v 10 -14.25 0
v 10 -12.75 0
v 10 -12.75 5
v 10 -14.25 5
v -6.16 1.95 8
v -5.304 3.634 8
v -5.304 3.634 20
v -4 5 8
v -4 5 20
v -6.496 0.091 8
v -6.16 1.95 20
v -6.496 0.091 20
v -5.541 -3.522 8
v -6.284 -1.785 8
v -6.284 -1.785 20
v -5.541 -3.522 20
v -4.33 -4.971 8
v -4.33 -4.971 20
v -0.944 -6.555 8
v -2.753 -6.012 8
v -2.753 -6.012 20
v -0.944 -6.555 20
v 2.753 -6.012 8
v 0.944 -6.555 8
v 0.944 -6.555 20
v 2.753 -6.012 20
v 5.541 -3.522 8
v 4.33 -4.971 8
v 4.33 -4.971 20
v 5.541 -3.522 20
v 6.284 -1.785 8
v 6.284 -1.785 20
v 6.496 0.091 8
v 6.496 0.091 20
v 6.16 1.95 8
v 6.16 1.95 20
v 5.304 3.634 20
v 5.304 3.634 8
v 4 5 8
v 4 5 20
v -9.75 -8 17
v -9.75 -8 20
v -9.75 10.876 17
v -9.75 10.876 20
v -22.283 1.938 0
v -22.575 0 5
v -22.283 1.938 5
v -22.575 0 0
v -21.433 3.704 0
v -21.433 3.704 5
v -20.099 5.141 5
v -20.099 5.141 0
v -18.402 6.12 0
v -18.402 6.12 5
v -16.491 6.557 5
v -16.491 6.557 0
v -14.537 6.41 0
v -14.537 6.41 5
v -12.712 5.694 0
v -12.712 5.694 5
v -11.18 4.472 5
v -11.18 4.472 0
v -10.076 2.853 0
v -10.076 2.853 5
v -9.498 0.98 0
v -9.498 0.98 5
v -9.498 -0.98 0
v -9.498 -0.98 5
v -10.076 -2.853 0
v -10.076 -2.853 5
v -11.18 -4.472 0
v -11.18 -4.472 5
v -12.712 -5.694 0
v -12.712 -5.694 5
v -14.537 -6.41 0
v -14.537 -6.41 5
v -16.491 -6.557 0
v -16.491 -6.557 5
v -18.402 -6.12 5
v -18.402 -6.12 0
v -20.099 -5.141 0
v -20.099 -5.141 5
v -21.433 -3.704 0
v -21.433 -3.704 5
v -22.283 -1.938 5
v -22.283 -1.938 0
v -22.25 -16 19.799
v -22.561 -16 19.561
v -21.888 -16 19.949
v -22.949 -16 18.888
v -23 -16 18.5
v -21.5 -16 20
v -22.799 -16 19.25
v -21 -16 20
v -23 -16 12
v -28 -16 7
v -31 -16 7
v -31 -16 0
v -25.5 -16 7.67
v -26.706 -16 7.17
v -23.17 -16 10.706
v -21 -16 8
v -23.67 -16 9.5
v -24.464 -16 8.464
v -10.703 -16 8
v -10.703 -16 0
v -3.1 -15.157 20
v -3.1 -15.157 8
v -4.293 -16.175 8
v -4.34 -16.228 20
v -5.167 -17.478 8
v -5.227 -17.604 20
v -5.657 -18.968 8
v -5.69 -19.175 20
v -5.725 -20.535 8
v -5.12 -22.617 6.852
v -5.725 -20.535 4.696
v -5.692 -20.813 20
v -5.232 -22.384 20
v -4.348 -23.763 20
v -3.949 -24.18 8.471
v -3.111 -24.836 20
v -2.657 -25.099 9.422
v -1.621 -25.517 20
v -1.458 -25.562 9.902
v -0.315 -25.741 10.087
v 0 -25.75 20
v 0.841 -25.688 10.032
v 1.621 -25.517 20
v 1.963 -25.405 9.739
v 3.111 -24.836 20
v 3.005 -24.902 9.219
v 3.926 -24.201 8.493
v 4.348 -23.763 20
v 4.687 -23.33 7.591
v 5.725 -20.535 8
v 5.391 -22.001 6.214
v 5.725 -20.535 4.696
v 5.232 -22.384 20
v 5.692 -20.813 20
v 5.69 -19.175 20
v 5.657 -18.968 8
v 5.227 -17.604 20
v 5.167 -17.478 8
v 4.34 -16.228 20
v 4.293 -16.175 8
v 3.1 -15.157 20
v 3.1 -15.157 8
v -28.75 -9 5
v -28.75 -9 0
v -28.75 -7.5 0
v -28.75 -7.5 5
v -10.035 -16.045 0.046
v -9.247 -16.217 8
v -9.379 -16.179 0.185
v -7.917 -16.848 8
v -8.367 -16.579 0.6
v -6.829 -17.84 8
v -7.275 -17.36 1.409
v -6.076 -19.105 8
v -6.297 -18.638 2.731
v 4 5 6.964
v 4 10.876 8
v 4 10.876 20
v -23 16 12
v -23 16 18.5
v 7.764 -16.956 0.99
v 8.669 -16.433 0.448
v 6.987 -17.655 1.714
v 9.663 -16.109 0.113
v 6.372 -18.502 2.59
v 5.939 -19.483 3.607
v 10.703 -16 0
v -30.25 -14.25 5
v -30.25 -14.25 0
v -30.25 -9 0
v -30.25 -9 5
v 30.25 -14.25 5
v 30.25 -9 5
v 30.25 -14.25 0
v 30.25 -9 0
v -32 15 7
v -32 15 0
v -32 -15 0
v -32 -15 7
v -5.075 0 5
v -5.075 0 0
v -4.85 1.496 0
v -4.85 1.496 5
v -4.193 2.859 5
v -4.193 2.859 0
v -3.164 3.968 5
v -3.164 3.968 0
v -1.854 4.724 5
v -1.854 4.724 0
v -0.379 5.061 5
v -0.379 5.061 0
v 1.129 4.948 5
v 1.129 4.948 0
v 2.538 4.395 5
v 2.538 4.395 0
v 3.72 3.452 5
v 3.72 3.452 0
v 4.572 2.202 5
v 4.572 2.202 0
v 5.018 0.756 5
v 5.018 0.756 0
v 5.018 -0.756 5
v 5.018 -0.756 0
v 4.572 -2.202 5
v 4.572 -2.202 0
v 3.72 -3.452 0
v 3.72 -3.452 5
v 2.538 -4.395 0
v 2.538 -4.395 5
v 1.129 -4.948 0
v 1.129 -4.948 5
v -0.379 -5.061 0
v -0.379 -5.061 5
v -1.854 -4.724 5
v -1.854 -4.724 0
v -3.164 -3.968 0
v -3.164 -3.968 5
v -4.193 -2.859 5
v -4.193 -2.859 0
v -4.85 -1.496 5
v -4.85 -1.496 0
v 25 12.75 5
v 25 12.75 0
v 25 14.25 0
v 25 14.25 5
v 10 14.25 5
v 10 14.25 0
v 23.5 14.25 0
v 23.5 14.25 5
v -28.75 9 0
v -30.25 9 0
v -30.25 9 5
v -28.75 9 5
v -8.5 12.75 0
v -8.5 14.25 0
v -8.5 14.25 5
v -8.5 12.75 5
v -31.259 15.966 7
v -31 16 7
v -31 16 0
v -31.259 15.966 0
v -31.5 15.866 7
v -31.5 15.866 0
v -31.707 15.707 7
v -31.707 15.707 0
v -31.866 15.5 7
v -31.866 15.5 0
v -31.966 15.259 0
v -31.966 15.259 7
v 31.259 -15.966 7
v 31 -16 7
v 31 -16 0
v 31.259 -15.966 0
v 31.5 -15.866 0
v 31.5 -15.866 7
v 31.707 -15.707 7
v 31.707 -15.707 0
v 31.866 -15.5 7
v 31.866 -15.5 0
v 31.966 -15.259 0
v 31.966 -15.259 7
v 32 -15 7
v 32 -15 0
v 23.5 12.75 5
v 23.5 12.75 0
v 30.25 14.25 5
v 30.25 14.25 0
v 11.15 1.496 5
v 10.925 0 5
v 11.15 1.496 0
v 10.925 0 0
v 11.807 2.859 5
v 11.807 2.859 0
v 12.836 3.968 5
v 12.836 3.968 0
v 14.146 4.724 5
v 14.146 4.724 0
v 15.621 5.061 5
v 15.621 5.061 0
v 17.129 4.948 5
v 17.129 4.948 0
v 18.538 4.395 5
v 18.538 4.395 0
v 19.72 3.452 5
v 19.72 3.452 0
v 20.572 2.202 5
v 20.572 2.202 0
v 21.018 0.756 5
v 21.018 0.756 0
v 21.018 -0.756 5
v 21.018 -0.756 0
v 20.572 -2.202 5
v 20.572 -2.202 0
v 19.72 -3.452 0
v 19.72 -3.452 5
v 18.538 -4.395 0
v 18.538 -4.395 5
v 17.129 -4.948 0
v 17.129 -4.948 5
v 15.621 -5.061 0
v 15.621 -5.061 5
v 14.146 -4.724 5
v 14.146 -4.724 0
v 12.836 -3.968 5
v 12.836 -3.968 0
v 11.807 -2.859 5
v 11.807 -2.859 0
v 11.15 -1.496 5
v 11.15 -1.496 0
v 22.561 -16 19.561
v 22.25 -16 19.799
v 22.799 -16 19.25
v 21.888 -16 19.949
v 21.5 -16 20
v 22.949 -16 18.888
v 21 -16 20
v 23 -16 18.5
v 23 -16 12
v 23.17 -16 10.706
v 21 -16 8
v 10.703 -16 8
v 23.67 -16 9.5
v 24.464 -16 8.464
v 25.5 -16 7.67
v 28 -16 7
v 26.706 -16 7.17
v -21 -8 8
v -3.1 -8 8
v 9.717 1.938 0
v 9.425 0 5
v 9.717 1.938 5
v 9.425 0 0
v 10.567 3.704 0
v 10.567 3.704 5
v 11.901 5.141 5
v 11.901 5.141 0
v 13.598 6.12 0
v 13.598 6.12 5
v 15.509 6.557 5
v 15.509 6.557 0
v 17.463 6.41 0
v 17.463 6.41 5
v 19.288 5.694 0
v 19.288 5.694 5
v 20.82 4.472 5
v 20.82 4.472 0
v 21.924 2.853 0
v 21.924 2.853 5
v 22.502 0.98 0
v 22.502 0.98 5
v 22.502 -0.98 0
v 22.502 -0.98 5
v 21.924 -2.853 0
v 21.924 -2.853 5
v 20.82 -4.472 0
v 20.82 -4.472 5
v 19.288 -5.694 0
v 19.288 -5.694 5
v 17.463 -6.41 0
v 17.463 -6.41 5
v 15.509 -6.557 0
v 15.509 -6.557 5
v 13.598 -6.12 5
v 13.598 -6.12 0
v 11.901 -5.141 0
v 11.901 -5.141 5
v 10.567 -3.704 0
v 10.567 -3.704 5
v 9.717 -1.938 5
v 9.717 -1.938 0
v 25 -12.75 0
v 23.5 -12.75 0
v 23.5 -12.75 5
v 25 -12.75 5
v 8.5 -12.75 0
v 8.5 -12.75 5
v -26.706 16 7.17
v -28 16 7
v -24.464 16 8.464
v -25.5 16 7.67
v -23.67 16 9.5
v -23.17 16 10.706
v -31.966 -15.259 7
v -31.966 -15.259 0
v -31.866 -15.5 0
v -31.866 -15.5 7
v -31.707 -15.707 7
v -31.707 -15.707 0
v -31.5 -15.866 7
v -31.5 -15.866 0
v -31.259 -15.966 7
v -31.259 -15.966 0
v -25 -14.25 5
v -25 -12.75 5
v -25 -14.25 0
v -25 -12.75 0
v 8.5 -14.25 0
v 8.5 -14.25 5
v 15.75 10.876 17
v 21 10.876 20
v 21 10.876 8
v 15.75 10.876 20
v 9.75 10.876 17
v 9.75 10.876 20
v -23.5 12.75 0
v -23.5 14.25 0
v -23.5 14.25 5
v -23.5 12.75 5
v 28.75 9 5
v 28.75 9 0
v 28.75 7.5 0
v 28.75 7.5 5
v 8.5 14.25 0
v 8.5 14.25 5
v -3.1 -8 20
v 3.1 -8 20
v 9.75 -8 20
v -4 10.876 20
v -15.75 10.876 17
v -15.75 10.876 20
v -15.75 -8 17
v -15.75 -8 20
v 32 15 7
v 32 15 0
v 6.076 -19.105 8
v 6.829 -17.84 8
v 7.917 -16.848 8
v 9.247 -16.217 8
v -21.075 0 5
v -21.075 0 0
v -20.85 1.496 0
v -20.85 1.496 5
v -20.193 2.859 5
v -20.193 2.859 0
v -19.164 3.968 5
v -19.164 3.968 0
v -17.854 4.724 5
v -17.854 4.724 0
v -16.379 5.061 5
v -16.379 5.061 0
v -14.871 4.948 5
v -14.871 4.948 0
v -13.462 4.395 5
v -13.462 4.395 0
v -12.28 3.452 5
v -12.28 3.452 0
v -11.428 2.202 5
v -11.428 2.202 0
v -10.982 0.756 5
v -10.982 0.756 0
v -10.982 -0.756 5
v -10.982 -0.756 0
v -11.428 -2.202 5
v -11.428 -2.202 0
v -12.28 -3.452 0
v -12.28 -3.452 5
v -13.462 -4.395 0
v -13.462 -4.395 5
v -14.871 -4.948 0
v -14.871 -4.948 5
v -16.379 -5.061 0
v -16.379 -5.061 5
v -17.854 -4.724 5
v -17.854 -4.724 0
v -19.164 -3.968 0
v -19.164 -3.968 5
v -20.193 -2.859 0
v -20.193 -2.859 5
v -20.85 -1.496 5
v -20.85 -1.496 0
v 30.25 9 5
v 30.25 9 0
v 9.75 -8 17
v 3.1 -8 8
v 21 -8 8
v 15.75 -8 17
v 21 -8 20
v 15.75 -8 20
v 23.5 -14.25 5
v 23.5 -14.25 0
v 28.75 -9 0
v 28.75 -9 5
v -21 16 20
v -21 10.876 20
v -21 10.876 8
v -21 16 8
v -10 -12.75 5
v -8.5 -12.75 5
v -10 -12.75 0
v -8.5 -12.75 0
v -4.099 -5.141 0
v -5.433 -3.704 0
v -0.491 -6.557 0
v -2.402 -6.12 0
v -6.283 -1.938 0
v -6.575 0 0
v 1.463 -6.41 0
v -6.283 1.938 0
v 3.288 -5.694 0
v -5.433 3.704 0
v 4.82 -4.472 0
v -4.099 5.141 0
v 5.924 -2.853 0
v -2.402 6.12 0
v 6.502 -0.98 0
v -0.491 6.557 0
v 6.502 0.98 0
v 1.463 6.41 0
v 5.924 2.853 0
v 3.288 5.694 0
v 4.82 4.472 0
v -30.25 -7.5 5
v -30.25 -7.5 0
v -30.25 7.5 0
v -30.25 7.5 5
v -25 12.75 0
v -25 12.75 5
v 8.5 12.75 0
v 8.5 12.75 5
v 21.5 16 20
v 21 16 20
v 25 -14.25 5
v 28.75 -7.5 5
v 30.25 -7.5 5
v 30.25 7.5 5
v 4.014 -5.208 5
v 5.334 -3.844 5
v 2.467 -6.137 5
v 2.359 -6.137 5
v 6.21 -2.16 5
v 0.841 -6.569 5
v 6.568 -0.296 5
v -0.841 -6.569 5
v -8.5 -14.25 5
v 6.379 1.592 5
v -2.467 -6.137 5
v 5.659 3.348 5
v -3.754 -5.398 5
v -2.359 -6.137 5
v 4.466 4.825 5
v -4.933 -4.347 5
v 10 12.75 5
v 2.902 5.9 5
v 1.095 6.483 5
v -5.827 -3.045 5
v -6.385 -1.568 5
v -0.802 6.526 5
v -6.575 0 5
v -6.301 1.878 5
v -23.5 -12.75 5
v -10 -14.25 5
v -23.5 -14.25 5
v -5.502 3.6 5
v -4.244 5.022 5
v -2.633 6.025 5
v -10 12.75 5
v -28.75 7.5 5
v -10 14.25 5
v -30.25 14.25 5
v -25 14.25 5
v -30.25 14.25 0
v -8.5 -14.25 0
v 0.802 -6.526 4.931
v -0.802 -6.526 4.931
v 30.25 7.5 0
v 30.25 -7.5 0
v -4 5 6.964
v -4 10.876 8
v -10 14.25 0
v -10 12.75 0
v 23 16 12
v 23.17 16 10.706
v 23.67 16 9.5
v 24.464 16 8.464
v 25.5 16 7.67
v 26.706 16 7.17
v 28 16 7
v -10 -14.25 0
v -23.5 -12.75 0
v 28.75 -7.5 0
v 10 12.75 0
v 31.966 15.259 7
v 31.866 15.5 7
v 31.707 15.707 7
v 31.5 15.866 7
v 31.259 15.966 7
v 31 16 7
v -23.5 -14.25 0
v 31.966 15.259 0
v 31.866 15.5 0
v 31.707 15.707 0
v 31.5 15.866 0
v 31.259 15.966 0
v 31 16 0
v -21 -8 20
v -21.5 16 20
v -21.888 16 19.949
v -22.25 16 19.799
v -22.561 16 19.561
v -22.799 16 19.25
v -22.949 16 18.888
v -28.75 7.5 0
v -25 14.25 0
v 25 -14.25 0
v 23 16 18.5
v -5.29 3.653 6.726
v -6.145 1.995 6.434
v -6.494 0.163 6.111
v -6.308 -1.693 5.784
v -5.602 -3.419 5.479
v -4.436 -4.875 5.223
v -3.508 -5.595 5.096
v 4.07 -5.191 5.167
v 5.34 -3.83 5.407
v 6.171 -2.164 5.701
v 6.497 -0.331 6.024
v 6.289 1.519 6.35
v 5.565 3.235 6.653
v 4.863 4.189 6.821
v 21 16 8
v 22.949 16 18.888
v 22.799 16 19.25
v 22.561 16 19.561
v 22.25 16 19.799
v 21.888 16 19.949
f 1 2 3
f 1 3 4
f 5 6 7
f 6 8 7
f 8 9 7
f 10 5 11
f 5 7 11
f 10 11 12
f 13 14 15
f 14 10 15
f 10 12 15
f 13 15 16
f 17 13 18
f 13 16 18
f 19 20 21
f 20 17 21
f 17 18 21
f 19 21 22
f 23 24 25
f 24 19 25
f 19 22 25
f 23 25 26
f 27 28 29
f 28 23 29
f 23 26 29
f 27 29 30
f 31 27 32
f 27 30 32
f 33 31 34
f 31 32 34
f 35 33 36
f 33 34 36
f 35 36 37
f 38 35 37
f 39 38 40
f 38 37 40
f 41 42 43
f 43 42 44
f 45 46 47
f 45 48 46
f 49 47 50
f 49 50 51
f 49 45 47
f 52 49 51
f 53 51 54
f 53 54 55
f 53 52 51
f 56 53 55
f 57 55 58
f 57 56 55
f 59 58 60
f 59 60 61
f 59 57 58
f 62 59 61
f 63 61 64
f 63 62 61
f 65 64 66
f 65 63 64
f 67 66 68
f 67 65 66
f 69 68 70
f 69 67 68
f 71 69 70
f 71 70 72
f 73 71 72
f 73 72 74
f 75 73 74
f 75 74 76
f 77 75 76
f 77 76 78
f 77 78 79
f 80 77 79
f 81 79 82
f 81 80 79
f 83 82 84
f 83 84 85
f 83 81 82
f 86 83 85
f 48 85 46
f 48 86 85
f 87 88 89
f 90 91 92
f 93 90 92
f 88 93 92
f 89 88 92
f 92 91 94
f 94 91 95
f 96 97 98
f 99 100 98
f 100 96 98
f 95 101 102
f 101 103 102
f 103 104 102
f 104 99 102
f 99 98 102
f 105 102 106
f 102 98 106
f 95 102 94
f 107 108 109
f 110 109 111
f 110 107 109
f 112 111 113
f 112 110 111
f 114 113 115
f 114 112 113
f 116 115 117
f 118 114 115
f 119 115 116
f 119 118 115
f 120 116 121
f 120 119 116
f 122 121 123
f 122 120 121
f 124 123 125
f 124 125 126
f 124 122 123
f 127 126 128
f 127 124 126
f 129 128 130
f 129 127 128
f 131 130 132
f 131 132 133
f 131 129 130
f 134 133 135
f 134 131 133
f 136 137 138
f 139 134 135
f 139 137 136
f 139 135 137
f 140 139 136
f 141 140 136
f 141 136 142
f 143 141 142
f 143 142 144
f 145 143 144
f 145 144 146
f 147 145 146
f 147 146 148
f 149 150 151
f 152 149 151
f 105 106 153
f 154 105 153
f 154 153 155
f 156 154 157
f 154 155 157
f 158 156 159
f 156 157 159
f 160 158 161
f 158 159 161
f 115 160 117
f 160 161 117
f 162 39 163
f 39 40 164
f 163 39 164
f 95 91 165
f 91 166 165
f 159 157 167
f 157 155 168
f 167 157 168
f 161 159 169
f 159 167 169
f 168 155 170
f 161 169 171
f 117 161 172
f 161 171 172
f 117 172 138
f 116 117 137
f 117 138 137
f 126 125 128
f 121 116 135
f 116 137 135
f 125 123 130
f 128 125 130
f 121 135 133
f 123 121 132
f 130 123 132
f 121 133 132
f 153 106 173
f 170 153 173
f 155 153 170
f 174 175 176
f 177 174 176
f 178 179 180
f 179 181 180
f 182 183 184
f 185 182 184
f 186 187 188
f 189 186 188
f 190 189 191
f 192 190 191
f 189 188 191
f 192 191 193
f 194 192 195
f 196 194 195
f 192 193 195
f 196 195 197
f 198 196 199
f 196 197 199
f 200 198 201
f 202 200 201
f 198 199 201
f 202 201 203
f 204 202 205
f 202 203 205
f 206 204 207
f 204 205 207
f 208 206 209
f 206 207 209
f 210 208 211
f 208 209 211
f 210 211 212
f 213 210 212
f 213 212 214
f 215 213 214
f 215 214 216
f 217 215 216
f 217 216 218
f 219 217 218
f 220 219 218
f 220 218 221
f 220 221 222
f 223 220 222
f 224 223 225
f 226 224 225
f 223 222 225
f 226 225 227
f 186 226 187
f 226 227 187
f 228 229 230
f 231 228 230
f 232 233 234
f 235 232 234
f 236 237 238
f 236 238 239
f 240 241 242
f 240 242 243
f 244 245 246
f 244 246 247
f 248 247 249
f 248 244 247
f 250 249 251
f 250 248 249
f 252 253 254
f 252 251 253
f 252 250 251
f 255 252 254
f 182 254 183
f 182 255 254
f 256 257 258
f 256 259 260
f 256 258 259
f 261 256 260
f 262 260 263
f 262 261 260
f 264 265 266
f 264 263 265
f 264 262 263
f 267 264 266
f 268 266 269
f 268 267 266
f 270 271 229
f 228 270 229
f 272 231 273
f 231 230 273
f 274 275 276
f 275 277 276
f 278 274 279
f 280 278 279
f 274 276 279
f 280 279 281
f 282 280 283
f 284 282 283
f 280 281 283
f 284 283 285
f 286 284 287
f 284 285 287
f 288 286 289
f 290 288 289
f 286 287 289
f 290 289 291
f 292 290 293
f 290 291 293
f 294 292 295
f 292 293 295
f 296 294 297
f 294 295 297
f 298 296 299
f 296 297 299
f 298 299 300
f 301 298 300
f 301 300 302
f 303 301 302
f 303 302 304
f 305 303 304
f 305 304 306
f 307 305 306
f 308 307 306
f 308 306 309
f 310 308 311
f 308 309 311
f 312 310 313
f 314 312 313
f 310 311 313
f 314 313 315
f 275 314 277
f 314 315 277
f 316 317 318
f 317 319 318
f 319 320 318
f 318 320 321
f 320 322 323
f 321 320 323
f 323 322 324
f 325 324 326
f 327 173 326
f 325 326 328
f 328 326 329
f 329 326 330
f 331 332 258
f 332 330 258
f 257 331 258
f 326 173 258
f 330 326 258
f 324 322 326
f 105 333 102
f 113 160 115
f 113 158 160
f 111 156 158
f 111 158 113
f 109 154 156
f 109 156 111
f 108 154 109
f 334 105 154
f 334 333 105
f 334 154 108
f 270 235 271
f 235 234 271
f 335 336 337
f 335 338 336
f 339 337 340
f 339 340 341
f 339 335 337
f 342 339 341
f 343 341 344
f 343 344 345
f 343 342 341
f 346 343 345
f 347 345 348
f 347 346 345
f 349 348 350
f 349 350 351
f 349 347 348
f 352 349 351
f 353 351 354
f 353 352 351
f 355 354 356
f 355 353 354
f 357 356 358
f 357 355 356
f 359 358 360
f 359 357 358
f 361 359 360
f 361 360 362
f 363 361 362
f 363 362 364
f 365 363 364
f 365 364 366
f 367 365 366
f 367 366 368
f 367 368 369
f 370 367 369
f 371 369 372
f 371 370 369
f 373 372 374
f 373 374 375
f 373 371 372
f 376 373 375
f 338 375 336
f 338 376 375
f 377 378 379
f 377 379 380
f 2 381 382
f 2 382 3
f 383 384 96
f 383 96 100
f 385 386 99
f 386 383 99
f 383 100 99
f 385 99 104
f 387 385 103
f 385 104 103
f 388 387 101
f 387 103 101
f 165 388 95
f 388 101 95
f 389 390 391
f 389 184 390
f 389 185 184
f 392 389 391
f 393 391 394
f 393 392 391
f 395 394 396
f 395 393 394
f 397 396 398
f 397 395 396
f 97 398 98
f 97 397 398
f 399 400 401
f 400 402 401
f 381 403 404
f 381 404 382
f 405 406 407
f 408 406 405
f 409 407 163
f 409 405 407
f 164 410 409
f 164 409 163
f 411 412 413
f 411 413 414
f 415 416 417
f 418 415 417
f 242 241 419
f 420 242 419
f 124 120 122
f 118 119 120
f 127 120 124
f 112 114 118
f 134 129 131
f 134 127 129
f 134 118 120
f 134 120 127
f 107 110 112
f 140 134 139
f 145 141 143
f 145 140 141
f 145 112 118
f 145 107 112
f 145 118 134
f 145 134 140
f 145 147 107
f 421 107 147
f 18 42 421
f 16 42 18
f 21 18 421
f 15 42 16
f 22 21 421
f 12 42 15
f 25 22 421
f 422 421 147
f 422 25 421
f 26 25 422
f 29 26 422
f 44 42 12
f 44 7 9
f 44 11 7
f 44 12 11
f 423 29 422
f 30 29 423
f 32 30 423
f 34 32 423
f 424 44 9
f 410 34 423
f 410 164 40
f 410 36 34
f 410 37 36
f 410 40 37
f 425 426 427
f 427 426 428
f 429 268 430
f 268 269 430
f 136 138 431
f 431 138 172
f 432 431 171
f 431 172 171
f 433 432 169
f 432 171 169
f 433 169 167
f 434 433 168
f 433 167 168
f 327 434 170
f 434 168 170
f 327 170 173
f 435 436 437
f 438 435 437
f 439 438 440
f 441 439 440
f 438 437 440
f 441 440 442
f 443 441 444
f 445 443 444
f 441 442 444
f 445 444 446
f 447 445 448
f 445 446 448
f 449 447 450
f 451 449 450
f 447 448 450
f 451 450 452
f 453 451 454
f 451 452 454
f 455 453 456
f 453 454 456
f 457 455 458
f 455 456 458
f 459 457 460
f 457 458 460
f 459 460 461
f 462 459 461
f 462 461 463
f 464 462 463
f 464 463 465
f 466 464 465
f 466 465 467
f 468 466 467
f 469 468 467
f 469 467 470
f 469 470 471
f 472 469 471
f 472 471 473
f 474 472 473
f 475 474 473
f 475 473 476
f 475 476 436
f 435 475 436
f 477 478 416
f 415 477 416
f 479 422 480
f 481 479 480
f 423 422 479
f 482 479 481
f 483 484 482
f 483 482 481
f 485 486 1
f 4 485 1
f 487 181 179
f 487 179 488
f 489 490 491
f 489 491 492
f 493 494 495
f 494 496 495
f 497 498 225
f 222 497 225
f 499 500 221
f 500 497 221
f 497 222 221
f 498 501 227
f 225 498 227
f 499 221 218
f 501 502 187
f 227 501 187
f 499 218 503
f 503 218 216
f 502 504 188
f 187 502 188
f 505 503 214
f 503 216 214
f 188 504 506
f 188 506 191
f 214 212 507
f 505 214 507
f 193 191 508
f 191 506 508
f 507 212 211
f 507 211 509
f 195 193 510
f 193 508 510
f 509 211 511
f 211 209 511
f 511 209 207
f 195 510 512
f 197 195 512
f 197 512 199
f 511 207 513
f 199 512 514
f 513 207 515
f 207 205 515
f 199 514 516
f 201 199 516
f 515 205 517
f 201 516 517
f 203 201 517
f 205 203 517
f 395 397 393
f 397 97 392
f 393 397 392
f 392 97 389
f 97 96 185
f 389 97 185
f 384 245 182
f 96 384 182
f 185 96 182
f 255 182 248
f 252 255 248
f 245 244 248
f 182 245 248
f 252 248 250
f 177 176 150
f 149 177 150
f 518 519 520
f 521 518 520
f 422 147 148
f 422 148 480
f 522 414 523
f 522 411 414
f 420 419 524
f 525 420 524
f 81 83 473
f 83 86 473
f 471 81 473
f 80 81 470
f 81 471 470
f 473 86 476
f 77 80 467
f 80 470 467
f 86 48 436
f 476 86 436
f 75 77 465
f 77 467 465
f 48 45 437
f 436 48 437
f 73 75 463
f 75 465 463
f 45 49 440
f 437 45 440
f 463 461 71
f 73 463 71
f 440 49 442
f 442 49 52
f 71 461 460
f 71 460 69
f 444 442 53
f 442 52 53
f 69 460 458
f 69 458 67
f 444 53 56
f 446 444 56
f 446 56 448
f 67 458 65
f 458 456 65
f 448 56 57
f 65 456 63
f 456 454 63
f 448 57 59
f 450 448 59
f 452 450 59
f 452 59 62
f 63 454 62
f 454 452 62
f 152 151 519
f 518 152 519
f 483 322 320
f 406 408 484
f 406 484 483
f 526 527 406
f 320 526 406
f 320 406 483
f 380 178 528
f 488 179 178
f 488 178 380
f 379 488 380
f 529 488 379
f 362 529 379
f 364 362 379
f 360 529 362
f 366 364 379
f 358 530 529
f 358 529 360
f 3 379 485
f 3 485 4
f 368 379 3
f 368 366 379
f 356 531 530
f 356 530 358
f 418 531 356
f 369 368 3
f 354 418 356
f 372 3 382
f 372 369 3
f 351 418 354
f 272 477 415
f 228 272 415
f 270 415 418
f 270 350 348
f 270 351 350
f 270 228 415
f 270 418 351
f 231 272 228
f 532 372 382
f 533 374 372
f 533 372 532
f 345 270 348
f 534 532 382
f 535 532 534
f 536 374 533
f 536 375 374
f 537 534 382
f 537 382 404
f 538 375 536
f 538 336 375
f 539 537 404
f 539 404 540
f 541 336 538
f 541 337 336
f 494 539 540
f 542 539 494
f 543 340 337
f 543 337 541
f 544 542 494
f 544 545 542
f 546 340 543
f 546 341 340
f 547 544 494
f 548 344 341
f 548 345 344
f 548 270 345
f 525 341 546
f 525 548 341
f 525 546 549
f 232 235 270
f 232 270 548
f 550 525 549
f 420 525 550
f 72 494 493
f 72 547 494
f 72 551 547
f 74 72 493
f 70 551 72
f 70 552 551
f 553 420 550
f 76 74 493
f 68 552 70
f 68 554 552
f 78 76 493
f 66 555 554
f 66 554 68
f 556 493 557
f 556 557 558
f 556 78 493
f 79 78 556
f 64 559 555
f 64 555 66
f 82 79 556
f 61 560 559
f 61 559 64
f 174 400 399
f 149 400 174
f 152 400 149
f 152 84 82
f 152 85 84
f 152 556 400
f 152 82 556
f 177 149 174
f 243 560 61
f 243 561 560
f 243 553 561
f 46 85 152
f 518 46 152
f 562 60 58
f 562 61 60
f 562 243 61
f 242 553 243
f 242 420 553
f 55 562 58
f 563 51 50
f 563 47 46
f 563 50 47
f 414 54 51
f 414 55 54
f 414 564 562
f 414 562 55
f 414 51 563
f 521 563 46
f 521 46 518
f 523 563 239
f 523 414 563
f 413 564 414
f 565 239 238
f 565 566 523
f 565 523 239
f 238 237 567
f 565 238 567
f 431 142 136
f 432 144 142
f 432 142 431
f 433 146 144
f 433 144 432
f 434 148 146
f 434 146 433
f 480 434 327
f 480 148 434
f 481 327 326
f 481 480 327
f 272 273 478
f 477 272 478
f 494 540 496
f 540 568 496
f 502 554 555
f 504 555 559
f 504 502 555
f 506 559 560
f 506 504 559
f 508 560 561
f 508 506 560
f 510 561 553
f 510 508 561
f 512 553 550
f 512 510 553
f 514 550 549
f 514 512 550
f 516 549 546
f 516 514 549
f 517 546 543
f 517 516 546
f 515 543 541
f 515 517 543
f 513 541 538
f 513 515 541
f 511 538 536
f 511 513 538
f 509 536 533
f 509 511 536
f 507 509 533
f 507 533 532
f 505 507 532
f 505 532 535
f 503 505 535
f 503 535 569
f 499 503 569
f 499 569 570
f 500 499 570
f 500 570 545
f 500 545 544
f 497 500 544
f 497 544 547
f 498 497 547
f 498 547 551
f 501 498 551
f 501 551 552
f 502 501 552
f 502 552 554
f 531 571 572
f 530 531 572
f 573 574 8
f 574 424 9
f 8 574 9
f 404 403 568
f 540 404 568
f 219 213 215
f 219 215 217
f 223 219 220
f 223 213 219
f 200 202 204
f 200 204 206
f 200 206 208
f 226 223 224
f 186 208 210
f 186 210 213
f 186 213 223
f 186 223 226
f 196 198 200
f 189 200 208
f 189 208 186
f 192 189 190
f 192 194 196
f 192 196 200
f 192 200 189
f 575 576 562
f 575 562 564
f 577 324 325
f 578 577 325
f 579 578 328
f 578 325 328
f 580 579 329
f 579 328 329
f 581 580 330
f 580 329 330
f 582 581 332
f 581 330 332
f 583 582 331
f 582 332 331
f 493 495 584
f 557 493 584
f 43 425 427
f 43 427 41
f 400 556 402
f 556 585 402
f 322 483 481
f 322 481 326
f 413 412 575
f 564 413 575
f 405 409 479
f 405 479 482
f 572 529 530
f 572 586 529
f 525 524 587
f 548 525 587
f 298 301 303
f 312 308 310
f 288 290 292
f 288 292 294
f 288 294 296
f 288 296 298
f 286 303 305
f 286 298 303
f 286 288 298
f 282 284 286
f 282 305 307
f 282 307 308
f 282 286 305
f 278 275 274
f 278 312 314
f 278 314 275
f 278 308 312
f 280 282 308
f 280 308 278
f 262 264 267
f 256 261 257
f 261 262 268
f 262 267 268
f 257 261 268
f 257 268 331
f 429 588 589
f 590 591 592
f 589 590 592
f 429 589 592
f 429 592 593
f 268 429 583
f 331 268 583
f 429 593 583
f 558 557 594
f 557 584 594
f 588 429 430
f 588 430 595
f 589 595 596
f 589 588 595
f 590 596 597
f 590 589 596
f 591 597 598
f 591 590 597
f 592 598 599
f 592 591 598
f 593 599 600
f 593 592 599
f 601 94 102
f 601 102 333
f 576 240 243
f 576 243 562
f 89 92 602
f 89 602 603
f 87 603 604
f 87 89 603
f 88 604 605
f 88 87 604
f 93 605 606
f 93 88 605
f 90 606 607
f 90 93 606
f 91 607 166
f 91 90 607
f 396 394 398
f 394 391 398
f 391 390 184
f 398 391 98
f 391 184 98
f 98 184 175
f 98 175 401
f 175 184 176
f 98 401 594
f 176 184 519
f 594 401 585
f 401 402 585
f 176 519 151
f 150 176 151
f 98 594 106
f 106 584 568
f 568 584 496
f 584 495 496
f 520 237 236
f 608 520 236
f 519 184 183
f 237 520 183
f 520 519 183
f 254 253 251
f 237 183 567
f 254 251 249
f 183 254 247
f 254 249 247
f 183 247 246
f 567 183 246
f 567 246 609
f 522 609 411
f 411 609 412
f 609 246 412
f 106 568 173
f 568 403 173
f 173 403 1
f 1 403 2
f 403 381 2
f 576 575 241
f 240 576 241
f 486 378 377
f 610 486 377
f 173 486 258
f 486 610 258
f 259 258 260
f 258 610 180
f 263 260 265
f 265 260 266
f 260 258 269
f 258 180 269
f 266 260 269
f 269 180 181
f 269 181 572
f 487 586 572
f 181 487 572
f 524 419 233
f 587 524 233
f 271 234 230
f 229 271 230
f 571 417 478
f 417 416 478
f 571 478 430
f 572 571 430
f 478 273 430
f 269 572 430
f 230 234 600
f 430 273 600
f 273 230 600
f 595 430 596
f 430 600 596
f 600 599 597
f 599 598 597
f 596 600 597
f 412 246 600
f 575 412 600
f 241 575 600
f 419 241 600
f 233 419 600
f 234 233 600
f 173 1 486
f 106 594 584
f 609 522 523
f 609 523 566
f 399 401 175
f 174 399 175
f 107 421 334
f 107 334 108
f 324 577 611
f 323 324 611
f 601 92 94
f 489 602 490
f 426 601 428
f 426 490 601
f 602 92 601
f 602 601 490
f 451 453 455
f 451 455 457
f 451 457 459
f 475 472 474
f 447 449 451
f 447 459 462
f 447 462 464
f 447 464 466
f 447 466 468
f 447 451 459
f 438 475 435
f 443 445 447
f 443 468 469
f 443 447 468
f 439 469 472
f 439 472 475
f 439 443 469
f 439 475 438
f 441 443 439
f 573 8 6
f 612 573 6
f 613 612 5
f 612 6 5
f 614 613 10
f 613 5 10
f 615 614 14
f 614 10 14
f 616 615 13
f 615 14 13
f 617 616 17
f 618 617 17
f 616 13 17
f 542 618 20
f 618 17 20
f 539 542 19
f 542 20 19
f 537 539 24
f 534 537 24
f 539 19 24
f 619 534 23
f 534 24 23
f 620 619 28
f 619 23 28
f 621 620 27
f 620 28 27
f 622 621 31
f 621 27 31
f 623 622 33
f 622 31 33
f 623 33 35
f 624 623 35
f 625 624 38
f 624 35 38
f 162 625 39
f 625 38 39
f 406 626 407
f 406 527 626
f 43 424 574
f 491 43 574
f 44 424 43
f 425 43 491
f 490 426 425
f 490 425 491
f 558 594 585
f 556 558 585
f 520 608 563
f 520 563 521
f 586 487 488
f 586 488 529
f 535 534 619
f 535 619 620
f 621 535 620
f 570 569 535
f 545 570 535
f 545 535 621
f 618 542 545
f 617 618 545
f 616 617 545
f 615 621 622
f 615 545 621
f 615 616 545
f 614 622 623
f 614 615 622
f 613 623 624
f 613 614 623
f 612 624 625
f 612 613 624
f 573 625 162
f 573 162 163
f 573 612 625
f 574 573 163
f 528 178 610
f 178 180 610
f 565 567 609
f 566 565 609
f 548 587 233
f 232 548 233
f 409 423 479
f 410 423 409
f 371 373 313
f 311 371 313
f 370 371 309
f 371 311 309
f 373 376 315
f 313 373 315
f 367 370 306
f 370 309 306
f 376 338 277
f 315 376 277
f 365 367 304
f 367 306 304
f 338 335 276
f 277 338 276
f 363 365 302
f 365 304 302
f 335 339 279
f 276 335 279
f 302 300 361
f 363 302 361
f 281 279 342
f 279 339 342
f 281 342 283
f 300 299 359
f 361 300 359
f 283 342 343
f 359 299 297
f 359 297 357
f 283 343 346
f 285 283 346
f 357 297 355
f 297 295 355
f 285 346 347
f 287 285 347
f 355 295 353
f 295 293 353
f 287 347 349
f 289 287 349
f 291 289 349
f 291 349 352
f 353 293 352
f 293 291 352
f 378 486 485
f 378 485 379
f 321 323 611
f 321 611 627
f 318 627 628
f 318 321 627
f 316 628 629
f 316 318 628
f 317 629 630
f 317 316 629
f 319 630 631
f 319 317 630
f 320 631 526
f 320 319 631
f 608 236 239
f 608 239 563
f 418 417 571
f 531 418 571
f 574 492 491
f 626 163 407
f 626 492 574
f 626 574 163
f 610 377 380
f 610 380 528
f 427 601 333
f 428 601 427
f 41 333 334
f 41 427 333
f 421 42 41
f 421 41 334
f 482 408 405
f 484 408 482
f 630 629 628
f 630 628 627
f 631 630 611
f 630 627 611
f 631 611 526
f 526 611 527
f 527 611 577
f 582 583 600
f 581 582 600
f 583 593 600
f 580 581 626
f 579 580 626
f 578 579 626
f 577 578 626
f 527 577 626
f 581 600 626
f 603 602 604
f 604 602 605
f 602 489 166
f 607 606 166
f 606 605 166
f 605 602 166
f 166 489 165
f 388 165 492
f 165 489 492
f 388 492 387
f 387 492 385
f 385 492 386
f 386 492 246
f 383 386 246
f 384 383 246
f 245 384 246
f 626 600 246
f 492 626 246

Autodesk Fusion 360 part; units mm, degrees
sketch "Skizze1" plane through (0, 0, 0) normal (0, 0, 1) x (1, 0, 0)
  line L0 (32, 16) -> (-32, 16)
  line L1 (-32, 16) -> (-32, -16)
  line L2 (-32, -16) -> (32, -16)
  line L3 (32, -16) -> (32, 16)
  line L4 (32, 16) -> (-32, -16) construction
  line L5 (-32, 16) -> (32, -16) construction
  dimension "d1" = 64
  dimension "d2" = 32
extrude "Extrusion1" add sketch "Skizze1" along normal blind 20
sketch "Skizze2" plane through (0, 0, 0) normal (0, 0, -1) x (-1, 0, 0)
  line L0 (-32, 16) -> (-32, -16)
  line L1 (-32, -16) -> (32, -16)
  line L2 (32, -16) -> (32, 16)
  line L3 (32, 16) -> (-32, 16)
  line L4 (30.25, 14.25) -> (-30.25, 14.25)
  line L5 (-30.25, 14.25) -> (-30.25, -14.25)
  line L6 (-30.25, -14.25) -> (30.25, -14.25)
  line L7 (30.25, -14.25) -> (30.25, 14.25)
  line L8 (30.25, 14.25) -> (-30.25, -14.25) construction
  line L9 (-30.25, 14.25) -> (30.25, -14.25) construction
  line L10 (-25, 14.25) -> (-23.5, 14.25)
  line L11 (-23.5, 14.25) -> (-23.5, 12.75)
  line L12 (-23.5, 12.75) -> (-25, 12.75)
  line L13 (-25, 12.75) -> (-25, 14.25)
  line L14 (-30.25, 9) -> (-28.75, 9)
  line L15 (-28.75, 9) -> (-28.75, 7.5)
  line L16 (-28.75, 7.5) -> (-30.25, 7.5)
  line L17 (-30.25, 7.5) -> (-30.25, 9)
  line L18 (-10, 14.25) -> (-8.5, 14.25)
  line L19 (-8.5, 14.25) -> (-8.5, 12.75)
  line L20 (-8.5, 12.75) -> (-10, 12.75)
  line L21 (-10, 12.75) -> (-10, 14.25)
  line L22 (-24.25, 12.75) -> (-24.25, 14.25) construction
  line L23 (-28.75, 8.25) -> (-30.25, 8.25) construction
  line L24 (-9.25, 12.75) -> (-9.25, 14.25) construction
  line L25 (0, 0) -> (0, 14.25) construction
  line L26 (0, 0) -> (-30.25, 0) construction
  line L27 (24.25, 12.75) -> (24.25, 14.25) construction
  line L28 (8.5, 14.25) -> (8.5, 12.75)
  line L29 (28.75, 7.5) -> (30.25, 7.5)
  line L30 (10, 14.25) -> (8.5, 14.25)
  line L31 (8.5, 12.75) -> (10, 12.75)
  line L32 (23.5, 12.75) -> (25, 12.75)
  line L33 (28.75, 8.25) -> (30.25, 8.25) construction
  line L34 (28.75, 9) -> (28.75, 7.5)
  line L35 (25, 12.75) -> (25, 14.25)
  line L36 (30.25, 7.5) -> (30.25, 9)
  line L37 (9.25, 12.75) -> (9.25, 14.25) construction
  line L38 (30.25, 9) -> (28.75, 9)
  line L39 (10, 12.75) -> (10, 14.25)
  line L40 (25, 14.25) -> (23.5, 14.25)
  line L41 (23.5, 14.25) -> (23.5, 12.75)
  line L42 (-25, -12.75) -> (-25, -14.25)
  line L43 (-28.75, -9) -> (-28.75, -7.5)
  line L44 (-30.25, -9) -> (-28.75, -9)
  line L45 (30.25, -14.25) -> (-30.25, -14.25)
  line L46 (-28.75, -8.25) -> (-30.25, -8.25) construction
  line L47 (25, -14.25) -> (23.5, -14.25)
  line L48 (-10, -14.25) -> (-8.5, -14.25)
  line L49 (23.5, -12.75) -> (25, -12.75)
  line L50 (-23.5, -14.25) -> (-23.5, -12.75)
  line L51 (32, -16) -> (-32, -16)
  line L52 (10, -12.75) -> (10, -14.25)
  line L53 (-9.25, -12.75) -> (-9.25, -14.25) construction
  line L54 (-28.75, -7.5) -> (-30.25, -7.5)
  line L55 (8.5, -12.75) -> (10, -12.75)
  line L56 (-10, -12.75) -> (-10, -14.25)
  line L57 (28.75, -8.25) -> (30.25, -8.25) construction
  line L58 (-25, -14.25) -> (-23.5, -14.25)
  line L59 (8.5, -14.25) -> (8.5, -12.75)
  line L60 (24.25, -12.75) -> (24.25, -14.25) construction
  line L61 (-23.5, -12.75) -> (-25, -12.75)
  line L62 (30.25, -9) -> (28.75, -9)
  line L63 (-8.5, -14.25) -> (-8.5, -12.75)
  line L64 (23.5, -14.25) -> (23.5, -12.75)
  line L65 (30.25, -7.5) -> (30.25, -9)
  line L66 (10, -14.25) -> (8.5, -14.25)
  line L67 (-24.25, -12.75) -> (-24.25, -14.25) construction
  line L68 (28.75, -9) -> (28.75, -7.5)
  line L69 (9.25, -12.75) -> (9.25, -14.25) construction
  line L70 (-8.5, -12.75) -> (-10, -12.75)
  line L71 (-30.25, -7.5) -> (-30.25, -9)
  line L72 (28.75, -7.5) -> (30.25, -7.5)
  line L73 (25, -12.75) -> (25, -14.25)
  circle A0 centre (0, 0) radius 6.575
  circle A1 centre (16, 0) radius 6.575
  circle A2 centre (-16, 0) radius 6.575
  circle A3 centre (-16, 0) radius 5.075
  circle A4 centre (0, 0) radius 5.075
  circle A5 centre (16, 0) radius 5.075
  point P0 (32, 16)
  point P1 (30.25, 14.25)
  point P2 (0, -14.25)
  point P3 (32, -16)
  point P4 (30.25, -14.25)
  dimension "d7" = 1.75
  dimension "d8" = 1.75
  dimension "d9" = 1.5
  dimension "d10" = 1.5
  dimension "d11" = 6
  dimension "d12" = 6
  dimension "d13" = 15
  dimension "d14" = 13.15
  dimension "d17" = 16
  dimension "d18" = 0
  dimension "d19" = 1.5
extrude "Extrusion2" cut sketch "Skizze2" against normal blind 5 contours L4 L5 L6 L7 L11 L12 L13 L14 L15 L16 L19 L20 L21 L28 L29 L31 L32 L34 L35 L38 L39 L41 L42 L43 L44 L45 L49 L50 L52 L54 L55 L56 L59 L61 L62 L63 L64 L68 L70 L72 L73 | A3 | A4 | A5
sketch "Skizze3" plane through (0, 0, 20) normal (0, 0, 1) x (1, 0, 0)
  line L0 (32, -16) -> (32, 16)
  line L1 (32, 16) -> (-32, 16)
  line L2 (-32, 16) -> (-32, -16)
  line L3 (-32, -16) -> (32, -16)
  circle A0 centre (0, -0.1235) radius 6.5
  line L4 (0, -0.1235) -> (0, 16) construction
  line L5 (-21, 16) -> (21, 16)
  line L6 (21, 16) -> (21, 10.8765)
  line L7 (21, 10.8765) -> (-21, 10.8765)
  line L8 (-21, 10.8765) -> (-21, 16)
  line L9 (-21, 16) -> (21, 10.8765) construction
  line L10 (21, 16) -> (-21, 10.8765) construction
  line L11 (-4, 5) -> (4, 5)
  line L12 (4, 5) -> (4, 10.8765)
  line L13 (4, 10.8765) -> (-4, 10.8765)
  line L14 (-4, 10.8765) -> (-4, 5)
  line L15 (-4, 5) -> (4, 10.8765) construction
  line L16 (4, 5) -> (-4, 10.8765) construction
  point P0 (0, 13.4383)
  point P1 (0, 7.9383)
  dimension "d22" = 42
  dimension "d23" = 8
  dimension "d24" = 13
  dimension "d25" = 11
extrude "Extrusion3" cut sketch "Skizze3" against normal blind 12 contours L1 L5 L6 L7 L8 L13 | A0 L7 L12 L13 L14 | A0 L11 | A0 L11
sketch "Skizze4" plane through (0, 0, 20) normal (0, 0, 1) x (1, 0, 0)
  line L0 (-21, 10.8765) -> (-21, 16)
  line L1 (-21, 16) -> (-32, 16)
  line L2 (-32, 16) -> (-32, -16)
  line L3 (-32, -16) -> (32, -16)
  line L4 (32, -16) -> (32, 16)
  line L5 (32, 16) -> (21, 16)
  line L6 (21, 16) -> (21, 10.8765)
  line L7 (21, 10.8765) -> (4, 10.8765)
  line L8 (4, 10.8765) -> (4, 5)
  arc A0 (-4, 5) -> (4, 5) centre (0, -0.1235) ccw
  line L9 (-4, 5) -> (-4, 10.8765)
  line L10 (-4, 10.8765) -> (-21, 10.8765)
  line L11 (0, 0) -> (0, -20) construction
  circle A1 centre (0, -20) radius 5.75
  line L12 (-3.1, -15.1572) -> (3.1, -15.1572)
  line L13 (3.1, -15.1572) -> (3.1, -8)
  line L14 (3.1, -8) -> (-3.1, -8)
  line L15 (-3.1, -8) -> (-3.1, -15.1572)
  line L16 (-3.1, -15.1572) -> (3.1, -8) construction
  line L17 (3.1, -15.1572) -> (-3.1, -8) construction
  line L18 (-21, -8) -> (21, -8)
  line L19 (21, -8) -> (21, -28)
  line L20 (21, -28) -> (-21, -28)
  line L21 (-21, -28) -> (-21, -8)
  line L22 (-21, -8) -> (21, -28) construction
  line L23 (21, -8) -> (-21, -28) construction
  point P0 (0, -11.5786)
  point P1 (0, -18)
  dimension "d29" = 11.5
  dimension "d30" = 6.2
  dimension "d31" = 8
  dimension "d32" = 12
  dimension "d33" = 20
  dimension "d34" = 42
extrude "Extrusion4" cut sketch "Skizze4" against normal blind 12 contours L3 A1 L15 L18 L21 | L3 A1 L13 L18 L19
extrude "Extrusion5" add sketch "Skizze4" against normal blind 20 contours L3 A1
fillet "Abrundung1" radius 5 2 edges at (-4.1307, -16, 4) (4.1307, -16, 4)
sketch "Skizze5" plane through (0, 0, 20) normal (0, 0, 1) x (1, 0, 0)
  line L0 (21, -8) -> (21, -16)
  line L1 (21, -16) -> (32, -16)
  line L2 (32, -16) -> (32, 16)
  line L3 (32, 16) -> (21, 16)
  line L4 (21, 16) -> (21, 10.8765)
  line L5 (21, 10.8765) -> (4, 10.8765)
  line L6 (4, 10.8765) -> (4, 5)
  arc A0 (-4, 5) -> (4, 5) centre (0, -0.1235) ccw
  line L7 (-4, 5) -> (-4, 10.8765)
  line L8 (-4, 10.8765) -> (-21, 10.8765)
  line L9 (-21, 10.8765) -> (-21, 16)
  line L10 (-21, 16) -> (-32, 16)
  line L11 (-32, 16) -> (-32, -16)
  line L12 (-32, -16) -> (-21, -16)
  line L13 (-21, -16) -> (-21, -8)
  line L14 (-21, -8) -> (-3.1, -8)
  line L15 (-3.1, -8) -> (-3.1, -15.1572)
  arc A1 (-3.1, -15.1572) -> (3.1, -15.1572) centre (0, -20) ccw
  line L16 (3.1, -15.1572) -> (3.1, -8)
  line L17 (3.1, -8) -> (21, -8)
  line L18 (0, -0.1235) -> (0, 16)
  line L19 (-9.75, 16) -> (-15.75, 16)
  line L20 (-15.75, 16) -> (-15.75, -16)
  line L21 (-15.75, -16) -> (-9.75, -16)
  line L22 (-9.75, -16) -> (-9.75, 16)
  line L23 (9.75, 16) -> (15.75, 16)
  line L24 (15.75, 16) -> (15.75, -16)
  line L25 (15.75, -16) -> (9.75, -16)
  line L26 (9.75, -16) -> (9.75, 16)
  dimension "d41" = 6
  dimension "d42" = 19.5
extrude "Extrusion6" cut sketch "Skizze5" against normal blind 3 contours L5 L17 L24 L26 | L8 L14 L20 L22
sketch "Skizze7" plane through (32, 0, 0) normal (1, 0, 0) x (0, 0, -1)
  line L0 (-20, -16) -> (0, -16)
  line L1 (0, -16) -> (0, 16)
  line L2 (0, 16) -> (-20, 16)
  line L3 (0, -16) -> (-11.3908, -27)
  line L4 (-11.3908, -27) -> (0, -27)
  line L5 (0, -27) -> (0, -16)
  line L6 (-20, 16) -> (-20, -16)
  dimension "d46" = 11
  dimension "d49" = 46
extrude "Extrusion7" cut sketch "Skizze7" against normal blind 64 contours L3 L4 L5
ref_plane "Arbeitsebene1" through (-12.5, 10.8765, 8) normal (0, -0.1736, 0.9848) x (-1, 0, 0)
sketch "Skizze8" plane through (0, 0, 8) normal (0, 0, 1) x (1, 0, 0)
  line L0 (-21, 10.8765) -> (-4, 10.8765)
  line L1 (-4, 10.8765) -> (-4, 5)
  arc A0 (-4, 5) -> (4, 5) centre (0, -0.1235) ccw
  line L2 (4, 5) -> (4, 10.8765)
  line L3 (4, 10.8765) -> (21, 10.8765)
  line L4 (21, 10.8765) -> (21, 16)
  line L5 (21, 16) -> (-21, 16)
  line L6 (-21, 16) -> (-21, 10.8765)
  line L7 (-4, 10.8765) -> (4, 10.8765)
extrude "Extrusion8" cut sketch "Skizze8" along normal up to surface contours L1 A0 L2 L7 end surface through (-12.5, 10.8765, 8) normal (0, -0.173648, 0.984808) offset 0
sketch "Skizze9" plane through (0, 16, 0) normal (0, 1, 0) x (-1, 0, 0)
  line L0 (21, 20) -> (21, 8)
  line L1 (21, 8) -> (-21, 8)
  line L2 (-21, 8) -> (-21, 20)
  line L3 (-21, 20) -> (-32, 20)
  line L4 (-32, 20) -> (-32, 0)
  line L5 (-32, 0) -> (32, 0)
  line L6 (32, 0) -> (32, 20)
  line L7 (32, 20) -> (21, 20)
  line L8 (23.5, 5) -> (25, 5)
  line L9 (25, 5) -> (30.25, 5)
  line L10 (30.25, 5) -> (28.75, 5)
  line L11 (28.75, 5) -> (30.25, 5)
  line L12 (30.25, 5) -> (28.75, 5)
  line L13 (28.75, 5) -> (30.25, 5)
  line L14 (30.25, 5) -> (25, 5)
  line L15 (25, 5) -> (23.5, 5)
  line L16 (23.5, 5) -> (10, 5)
  line L17 (10, 5) -> (8.5, 5)
  line L18 (8.5, 5) -> (-8.5, 5)
  line L19 (-8.5, 5) -> (-10, 5)
  line L20 (-10, 5) -> (-23.5, 5)
  line L21 (-23.5, 5) -> (-25, 5)
  line L22 (-25, 5) -> (-30.25, 5)
  line L23 (-30.25, 5) -> (-28.75, 5)
  line L24 (-28.75, 5) -> (-30.25, 5)
  line L25 (-30.25, 5) -> (-28.75, 5)
  line L26 (-28.75, 5) -> (-30.25, 5)
  line L27 (-30.25, 5) -> (-25, 5)
  line L28 (-25, 5) -> (-23.5, 5)
  line L29 (-23.5, 5) -> (-10, 5)
  line L30 (-10, 5) -> (-8.5, 5)
  line L31 (-8.5, 5) -> (8.5, 5)
  line L32 (8.5, 5) -> (10, 5)
  line L33 (10, 5) -> (23.5, 5)
  line L34 (9.425, 5) -> (22.575, 5)
  line L35 (-22.575, 5) -> (-9.425, 5)
  line L36 (2.3588, 5) -> (2.4665, 5)
  line L37 (2.4665, 5) -> (-2.4665, 5)
  line L38 (-2.4665, 5) -> (-2.3588, 5)
  line L39 (-6.575, 5) -> (6.575, 5)
  line L40 (-32, 7) -> (-23, 7)
  line L41 (-23, 7) -> (-23, 20)
  line L42 (-23, 20) -> (-32, 20)
  line L43 (-32, 20) -> (-32, 7)
  line L44 (32, 20) -> (23, 20)
  line L45 (23, 20) -> (23, 7)
  line L46 (23, 7) -> (32, 7)
  line L47 (32, 7) -> (32, 20)
  dimension "d55" = 2
  dimension "d56" = 2
  dimension "d57" = 2
extrude "Extrusion9" cut sketch "Skizze9" against normal blind 32 contours L6 L7 L44 L45 L46 L47 | L3 L4 L40 L41 L42 L43
fillet "Abrundung2" radius 5 2 edges at (-23, 0, 7) (23, 0, 7)
fillet "Abrundung3" radius 1.5 2 edges at (23, 0, 20) (-23, 0, 20)
fillet "Abrundung4" radius 1 4 edges at (-32, 16, 3.5) (-32, -16, 3.5) (32, 16, 3.5) (32, -16, 3.5)
equation "d8 = d7"
equation "d12 = d11"
equation "d56 = d55"
equation "d57 = d55"
